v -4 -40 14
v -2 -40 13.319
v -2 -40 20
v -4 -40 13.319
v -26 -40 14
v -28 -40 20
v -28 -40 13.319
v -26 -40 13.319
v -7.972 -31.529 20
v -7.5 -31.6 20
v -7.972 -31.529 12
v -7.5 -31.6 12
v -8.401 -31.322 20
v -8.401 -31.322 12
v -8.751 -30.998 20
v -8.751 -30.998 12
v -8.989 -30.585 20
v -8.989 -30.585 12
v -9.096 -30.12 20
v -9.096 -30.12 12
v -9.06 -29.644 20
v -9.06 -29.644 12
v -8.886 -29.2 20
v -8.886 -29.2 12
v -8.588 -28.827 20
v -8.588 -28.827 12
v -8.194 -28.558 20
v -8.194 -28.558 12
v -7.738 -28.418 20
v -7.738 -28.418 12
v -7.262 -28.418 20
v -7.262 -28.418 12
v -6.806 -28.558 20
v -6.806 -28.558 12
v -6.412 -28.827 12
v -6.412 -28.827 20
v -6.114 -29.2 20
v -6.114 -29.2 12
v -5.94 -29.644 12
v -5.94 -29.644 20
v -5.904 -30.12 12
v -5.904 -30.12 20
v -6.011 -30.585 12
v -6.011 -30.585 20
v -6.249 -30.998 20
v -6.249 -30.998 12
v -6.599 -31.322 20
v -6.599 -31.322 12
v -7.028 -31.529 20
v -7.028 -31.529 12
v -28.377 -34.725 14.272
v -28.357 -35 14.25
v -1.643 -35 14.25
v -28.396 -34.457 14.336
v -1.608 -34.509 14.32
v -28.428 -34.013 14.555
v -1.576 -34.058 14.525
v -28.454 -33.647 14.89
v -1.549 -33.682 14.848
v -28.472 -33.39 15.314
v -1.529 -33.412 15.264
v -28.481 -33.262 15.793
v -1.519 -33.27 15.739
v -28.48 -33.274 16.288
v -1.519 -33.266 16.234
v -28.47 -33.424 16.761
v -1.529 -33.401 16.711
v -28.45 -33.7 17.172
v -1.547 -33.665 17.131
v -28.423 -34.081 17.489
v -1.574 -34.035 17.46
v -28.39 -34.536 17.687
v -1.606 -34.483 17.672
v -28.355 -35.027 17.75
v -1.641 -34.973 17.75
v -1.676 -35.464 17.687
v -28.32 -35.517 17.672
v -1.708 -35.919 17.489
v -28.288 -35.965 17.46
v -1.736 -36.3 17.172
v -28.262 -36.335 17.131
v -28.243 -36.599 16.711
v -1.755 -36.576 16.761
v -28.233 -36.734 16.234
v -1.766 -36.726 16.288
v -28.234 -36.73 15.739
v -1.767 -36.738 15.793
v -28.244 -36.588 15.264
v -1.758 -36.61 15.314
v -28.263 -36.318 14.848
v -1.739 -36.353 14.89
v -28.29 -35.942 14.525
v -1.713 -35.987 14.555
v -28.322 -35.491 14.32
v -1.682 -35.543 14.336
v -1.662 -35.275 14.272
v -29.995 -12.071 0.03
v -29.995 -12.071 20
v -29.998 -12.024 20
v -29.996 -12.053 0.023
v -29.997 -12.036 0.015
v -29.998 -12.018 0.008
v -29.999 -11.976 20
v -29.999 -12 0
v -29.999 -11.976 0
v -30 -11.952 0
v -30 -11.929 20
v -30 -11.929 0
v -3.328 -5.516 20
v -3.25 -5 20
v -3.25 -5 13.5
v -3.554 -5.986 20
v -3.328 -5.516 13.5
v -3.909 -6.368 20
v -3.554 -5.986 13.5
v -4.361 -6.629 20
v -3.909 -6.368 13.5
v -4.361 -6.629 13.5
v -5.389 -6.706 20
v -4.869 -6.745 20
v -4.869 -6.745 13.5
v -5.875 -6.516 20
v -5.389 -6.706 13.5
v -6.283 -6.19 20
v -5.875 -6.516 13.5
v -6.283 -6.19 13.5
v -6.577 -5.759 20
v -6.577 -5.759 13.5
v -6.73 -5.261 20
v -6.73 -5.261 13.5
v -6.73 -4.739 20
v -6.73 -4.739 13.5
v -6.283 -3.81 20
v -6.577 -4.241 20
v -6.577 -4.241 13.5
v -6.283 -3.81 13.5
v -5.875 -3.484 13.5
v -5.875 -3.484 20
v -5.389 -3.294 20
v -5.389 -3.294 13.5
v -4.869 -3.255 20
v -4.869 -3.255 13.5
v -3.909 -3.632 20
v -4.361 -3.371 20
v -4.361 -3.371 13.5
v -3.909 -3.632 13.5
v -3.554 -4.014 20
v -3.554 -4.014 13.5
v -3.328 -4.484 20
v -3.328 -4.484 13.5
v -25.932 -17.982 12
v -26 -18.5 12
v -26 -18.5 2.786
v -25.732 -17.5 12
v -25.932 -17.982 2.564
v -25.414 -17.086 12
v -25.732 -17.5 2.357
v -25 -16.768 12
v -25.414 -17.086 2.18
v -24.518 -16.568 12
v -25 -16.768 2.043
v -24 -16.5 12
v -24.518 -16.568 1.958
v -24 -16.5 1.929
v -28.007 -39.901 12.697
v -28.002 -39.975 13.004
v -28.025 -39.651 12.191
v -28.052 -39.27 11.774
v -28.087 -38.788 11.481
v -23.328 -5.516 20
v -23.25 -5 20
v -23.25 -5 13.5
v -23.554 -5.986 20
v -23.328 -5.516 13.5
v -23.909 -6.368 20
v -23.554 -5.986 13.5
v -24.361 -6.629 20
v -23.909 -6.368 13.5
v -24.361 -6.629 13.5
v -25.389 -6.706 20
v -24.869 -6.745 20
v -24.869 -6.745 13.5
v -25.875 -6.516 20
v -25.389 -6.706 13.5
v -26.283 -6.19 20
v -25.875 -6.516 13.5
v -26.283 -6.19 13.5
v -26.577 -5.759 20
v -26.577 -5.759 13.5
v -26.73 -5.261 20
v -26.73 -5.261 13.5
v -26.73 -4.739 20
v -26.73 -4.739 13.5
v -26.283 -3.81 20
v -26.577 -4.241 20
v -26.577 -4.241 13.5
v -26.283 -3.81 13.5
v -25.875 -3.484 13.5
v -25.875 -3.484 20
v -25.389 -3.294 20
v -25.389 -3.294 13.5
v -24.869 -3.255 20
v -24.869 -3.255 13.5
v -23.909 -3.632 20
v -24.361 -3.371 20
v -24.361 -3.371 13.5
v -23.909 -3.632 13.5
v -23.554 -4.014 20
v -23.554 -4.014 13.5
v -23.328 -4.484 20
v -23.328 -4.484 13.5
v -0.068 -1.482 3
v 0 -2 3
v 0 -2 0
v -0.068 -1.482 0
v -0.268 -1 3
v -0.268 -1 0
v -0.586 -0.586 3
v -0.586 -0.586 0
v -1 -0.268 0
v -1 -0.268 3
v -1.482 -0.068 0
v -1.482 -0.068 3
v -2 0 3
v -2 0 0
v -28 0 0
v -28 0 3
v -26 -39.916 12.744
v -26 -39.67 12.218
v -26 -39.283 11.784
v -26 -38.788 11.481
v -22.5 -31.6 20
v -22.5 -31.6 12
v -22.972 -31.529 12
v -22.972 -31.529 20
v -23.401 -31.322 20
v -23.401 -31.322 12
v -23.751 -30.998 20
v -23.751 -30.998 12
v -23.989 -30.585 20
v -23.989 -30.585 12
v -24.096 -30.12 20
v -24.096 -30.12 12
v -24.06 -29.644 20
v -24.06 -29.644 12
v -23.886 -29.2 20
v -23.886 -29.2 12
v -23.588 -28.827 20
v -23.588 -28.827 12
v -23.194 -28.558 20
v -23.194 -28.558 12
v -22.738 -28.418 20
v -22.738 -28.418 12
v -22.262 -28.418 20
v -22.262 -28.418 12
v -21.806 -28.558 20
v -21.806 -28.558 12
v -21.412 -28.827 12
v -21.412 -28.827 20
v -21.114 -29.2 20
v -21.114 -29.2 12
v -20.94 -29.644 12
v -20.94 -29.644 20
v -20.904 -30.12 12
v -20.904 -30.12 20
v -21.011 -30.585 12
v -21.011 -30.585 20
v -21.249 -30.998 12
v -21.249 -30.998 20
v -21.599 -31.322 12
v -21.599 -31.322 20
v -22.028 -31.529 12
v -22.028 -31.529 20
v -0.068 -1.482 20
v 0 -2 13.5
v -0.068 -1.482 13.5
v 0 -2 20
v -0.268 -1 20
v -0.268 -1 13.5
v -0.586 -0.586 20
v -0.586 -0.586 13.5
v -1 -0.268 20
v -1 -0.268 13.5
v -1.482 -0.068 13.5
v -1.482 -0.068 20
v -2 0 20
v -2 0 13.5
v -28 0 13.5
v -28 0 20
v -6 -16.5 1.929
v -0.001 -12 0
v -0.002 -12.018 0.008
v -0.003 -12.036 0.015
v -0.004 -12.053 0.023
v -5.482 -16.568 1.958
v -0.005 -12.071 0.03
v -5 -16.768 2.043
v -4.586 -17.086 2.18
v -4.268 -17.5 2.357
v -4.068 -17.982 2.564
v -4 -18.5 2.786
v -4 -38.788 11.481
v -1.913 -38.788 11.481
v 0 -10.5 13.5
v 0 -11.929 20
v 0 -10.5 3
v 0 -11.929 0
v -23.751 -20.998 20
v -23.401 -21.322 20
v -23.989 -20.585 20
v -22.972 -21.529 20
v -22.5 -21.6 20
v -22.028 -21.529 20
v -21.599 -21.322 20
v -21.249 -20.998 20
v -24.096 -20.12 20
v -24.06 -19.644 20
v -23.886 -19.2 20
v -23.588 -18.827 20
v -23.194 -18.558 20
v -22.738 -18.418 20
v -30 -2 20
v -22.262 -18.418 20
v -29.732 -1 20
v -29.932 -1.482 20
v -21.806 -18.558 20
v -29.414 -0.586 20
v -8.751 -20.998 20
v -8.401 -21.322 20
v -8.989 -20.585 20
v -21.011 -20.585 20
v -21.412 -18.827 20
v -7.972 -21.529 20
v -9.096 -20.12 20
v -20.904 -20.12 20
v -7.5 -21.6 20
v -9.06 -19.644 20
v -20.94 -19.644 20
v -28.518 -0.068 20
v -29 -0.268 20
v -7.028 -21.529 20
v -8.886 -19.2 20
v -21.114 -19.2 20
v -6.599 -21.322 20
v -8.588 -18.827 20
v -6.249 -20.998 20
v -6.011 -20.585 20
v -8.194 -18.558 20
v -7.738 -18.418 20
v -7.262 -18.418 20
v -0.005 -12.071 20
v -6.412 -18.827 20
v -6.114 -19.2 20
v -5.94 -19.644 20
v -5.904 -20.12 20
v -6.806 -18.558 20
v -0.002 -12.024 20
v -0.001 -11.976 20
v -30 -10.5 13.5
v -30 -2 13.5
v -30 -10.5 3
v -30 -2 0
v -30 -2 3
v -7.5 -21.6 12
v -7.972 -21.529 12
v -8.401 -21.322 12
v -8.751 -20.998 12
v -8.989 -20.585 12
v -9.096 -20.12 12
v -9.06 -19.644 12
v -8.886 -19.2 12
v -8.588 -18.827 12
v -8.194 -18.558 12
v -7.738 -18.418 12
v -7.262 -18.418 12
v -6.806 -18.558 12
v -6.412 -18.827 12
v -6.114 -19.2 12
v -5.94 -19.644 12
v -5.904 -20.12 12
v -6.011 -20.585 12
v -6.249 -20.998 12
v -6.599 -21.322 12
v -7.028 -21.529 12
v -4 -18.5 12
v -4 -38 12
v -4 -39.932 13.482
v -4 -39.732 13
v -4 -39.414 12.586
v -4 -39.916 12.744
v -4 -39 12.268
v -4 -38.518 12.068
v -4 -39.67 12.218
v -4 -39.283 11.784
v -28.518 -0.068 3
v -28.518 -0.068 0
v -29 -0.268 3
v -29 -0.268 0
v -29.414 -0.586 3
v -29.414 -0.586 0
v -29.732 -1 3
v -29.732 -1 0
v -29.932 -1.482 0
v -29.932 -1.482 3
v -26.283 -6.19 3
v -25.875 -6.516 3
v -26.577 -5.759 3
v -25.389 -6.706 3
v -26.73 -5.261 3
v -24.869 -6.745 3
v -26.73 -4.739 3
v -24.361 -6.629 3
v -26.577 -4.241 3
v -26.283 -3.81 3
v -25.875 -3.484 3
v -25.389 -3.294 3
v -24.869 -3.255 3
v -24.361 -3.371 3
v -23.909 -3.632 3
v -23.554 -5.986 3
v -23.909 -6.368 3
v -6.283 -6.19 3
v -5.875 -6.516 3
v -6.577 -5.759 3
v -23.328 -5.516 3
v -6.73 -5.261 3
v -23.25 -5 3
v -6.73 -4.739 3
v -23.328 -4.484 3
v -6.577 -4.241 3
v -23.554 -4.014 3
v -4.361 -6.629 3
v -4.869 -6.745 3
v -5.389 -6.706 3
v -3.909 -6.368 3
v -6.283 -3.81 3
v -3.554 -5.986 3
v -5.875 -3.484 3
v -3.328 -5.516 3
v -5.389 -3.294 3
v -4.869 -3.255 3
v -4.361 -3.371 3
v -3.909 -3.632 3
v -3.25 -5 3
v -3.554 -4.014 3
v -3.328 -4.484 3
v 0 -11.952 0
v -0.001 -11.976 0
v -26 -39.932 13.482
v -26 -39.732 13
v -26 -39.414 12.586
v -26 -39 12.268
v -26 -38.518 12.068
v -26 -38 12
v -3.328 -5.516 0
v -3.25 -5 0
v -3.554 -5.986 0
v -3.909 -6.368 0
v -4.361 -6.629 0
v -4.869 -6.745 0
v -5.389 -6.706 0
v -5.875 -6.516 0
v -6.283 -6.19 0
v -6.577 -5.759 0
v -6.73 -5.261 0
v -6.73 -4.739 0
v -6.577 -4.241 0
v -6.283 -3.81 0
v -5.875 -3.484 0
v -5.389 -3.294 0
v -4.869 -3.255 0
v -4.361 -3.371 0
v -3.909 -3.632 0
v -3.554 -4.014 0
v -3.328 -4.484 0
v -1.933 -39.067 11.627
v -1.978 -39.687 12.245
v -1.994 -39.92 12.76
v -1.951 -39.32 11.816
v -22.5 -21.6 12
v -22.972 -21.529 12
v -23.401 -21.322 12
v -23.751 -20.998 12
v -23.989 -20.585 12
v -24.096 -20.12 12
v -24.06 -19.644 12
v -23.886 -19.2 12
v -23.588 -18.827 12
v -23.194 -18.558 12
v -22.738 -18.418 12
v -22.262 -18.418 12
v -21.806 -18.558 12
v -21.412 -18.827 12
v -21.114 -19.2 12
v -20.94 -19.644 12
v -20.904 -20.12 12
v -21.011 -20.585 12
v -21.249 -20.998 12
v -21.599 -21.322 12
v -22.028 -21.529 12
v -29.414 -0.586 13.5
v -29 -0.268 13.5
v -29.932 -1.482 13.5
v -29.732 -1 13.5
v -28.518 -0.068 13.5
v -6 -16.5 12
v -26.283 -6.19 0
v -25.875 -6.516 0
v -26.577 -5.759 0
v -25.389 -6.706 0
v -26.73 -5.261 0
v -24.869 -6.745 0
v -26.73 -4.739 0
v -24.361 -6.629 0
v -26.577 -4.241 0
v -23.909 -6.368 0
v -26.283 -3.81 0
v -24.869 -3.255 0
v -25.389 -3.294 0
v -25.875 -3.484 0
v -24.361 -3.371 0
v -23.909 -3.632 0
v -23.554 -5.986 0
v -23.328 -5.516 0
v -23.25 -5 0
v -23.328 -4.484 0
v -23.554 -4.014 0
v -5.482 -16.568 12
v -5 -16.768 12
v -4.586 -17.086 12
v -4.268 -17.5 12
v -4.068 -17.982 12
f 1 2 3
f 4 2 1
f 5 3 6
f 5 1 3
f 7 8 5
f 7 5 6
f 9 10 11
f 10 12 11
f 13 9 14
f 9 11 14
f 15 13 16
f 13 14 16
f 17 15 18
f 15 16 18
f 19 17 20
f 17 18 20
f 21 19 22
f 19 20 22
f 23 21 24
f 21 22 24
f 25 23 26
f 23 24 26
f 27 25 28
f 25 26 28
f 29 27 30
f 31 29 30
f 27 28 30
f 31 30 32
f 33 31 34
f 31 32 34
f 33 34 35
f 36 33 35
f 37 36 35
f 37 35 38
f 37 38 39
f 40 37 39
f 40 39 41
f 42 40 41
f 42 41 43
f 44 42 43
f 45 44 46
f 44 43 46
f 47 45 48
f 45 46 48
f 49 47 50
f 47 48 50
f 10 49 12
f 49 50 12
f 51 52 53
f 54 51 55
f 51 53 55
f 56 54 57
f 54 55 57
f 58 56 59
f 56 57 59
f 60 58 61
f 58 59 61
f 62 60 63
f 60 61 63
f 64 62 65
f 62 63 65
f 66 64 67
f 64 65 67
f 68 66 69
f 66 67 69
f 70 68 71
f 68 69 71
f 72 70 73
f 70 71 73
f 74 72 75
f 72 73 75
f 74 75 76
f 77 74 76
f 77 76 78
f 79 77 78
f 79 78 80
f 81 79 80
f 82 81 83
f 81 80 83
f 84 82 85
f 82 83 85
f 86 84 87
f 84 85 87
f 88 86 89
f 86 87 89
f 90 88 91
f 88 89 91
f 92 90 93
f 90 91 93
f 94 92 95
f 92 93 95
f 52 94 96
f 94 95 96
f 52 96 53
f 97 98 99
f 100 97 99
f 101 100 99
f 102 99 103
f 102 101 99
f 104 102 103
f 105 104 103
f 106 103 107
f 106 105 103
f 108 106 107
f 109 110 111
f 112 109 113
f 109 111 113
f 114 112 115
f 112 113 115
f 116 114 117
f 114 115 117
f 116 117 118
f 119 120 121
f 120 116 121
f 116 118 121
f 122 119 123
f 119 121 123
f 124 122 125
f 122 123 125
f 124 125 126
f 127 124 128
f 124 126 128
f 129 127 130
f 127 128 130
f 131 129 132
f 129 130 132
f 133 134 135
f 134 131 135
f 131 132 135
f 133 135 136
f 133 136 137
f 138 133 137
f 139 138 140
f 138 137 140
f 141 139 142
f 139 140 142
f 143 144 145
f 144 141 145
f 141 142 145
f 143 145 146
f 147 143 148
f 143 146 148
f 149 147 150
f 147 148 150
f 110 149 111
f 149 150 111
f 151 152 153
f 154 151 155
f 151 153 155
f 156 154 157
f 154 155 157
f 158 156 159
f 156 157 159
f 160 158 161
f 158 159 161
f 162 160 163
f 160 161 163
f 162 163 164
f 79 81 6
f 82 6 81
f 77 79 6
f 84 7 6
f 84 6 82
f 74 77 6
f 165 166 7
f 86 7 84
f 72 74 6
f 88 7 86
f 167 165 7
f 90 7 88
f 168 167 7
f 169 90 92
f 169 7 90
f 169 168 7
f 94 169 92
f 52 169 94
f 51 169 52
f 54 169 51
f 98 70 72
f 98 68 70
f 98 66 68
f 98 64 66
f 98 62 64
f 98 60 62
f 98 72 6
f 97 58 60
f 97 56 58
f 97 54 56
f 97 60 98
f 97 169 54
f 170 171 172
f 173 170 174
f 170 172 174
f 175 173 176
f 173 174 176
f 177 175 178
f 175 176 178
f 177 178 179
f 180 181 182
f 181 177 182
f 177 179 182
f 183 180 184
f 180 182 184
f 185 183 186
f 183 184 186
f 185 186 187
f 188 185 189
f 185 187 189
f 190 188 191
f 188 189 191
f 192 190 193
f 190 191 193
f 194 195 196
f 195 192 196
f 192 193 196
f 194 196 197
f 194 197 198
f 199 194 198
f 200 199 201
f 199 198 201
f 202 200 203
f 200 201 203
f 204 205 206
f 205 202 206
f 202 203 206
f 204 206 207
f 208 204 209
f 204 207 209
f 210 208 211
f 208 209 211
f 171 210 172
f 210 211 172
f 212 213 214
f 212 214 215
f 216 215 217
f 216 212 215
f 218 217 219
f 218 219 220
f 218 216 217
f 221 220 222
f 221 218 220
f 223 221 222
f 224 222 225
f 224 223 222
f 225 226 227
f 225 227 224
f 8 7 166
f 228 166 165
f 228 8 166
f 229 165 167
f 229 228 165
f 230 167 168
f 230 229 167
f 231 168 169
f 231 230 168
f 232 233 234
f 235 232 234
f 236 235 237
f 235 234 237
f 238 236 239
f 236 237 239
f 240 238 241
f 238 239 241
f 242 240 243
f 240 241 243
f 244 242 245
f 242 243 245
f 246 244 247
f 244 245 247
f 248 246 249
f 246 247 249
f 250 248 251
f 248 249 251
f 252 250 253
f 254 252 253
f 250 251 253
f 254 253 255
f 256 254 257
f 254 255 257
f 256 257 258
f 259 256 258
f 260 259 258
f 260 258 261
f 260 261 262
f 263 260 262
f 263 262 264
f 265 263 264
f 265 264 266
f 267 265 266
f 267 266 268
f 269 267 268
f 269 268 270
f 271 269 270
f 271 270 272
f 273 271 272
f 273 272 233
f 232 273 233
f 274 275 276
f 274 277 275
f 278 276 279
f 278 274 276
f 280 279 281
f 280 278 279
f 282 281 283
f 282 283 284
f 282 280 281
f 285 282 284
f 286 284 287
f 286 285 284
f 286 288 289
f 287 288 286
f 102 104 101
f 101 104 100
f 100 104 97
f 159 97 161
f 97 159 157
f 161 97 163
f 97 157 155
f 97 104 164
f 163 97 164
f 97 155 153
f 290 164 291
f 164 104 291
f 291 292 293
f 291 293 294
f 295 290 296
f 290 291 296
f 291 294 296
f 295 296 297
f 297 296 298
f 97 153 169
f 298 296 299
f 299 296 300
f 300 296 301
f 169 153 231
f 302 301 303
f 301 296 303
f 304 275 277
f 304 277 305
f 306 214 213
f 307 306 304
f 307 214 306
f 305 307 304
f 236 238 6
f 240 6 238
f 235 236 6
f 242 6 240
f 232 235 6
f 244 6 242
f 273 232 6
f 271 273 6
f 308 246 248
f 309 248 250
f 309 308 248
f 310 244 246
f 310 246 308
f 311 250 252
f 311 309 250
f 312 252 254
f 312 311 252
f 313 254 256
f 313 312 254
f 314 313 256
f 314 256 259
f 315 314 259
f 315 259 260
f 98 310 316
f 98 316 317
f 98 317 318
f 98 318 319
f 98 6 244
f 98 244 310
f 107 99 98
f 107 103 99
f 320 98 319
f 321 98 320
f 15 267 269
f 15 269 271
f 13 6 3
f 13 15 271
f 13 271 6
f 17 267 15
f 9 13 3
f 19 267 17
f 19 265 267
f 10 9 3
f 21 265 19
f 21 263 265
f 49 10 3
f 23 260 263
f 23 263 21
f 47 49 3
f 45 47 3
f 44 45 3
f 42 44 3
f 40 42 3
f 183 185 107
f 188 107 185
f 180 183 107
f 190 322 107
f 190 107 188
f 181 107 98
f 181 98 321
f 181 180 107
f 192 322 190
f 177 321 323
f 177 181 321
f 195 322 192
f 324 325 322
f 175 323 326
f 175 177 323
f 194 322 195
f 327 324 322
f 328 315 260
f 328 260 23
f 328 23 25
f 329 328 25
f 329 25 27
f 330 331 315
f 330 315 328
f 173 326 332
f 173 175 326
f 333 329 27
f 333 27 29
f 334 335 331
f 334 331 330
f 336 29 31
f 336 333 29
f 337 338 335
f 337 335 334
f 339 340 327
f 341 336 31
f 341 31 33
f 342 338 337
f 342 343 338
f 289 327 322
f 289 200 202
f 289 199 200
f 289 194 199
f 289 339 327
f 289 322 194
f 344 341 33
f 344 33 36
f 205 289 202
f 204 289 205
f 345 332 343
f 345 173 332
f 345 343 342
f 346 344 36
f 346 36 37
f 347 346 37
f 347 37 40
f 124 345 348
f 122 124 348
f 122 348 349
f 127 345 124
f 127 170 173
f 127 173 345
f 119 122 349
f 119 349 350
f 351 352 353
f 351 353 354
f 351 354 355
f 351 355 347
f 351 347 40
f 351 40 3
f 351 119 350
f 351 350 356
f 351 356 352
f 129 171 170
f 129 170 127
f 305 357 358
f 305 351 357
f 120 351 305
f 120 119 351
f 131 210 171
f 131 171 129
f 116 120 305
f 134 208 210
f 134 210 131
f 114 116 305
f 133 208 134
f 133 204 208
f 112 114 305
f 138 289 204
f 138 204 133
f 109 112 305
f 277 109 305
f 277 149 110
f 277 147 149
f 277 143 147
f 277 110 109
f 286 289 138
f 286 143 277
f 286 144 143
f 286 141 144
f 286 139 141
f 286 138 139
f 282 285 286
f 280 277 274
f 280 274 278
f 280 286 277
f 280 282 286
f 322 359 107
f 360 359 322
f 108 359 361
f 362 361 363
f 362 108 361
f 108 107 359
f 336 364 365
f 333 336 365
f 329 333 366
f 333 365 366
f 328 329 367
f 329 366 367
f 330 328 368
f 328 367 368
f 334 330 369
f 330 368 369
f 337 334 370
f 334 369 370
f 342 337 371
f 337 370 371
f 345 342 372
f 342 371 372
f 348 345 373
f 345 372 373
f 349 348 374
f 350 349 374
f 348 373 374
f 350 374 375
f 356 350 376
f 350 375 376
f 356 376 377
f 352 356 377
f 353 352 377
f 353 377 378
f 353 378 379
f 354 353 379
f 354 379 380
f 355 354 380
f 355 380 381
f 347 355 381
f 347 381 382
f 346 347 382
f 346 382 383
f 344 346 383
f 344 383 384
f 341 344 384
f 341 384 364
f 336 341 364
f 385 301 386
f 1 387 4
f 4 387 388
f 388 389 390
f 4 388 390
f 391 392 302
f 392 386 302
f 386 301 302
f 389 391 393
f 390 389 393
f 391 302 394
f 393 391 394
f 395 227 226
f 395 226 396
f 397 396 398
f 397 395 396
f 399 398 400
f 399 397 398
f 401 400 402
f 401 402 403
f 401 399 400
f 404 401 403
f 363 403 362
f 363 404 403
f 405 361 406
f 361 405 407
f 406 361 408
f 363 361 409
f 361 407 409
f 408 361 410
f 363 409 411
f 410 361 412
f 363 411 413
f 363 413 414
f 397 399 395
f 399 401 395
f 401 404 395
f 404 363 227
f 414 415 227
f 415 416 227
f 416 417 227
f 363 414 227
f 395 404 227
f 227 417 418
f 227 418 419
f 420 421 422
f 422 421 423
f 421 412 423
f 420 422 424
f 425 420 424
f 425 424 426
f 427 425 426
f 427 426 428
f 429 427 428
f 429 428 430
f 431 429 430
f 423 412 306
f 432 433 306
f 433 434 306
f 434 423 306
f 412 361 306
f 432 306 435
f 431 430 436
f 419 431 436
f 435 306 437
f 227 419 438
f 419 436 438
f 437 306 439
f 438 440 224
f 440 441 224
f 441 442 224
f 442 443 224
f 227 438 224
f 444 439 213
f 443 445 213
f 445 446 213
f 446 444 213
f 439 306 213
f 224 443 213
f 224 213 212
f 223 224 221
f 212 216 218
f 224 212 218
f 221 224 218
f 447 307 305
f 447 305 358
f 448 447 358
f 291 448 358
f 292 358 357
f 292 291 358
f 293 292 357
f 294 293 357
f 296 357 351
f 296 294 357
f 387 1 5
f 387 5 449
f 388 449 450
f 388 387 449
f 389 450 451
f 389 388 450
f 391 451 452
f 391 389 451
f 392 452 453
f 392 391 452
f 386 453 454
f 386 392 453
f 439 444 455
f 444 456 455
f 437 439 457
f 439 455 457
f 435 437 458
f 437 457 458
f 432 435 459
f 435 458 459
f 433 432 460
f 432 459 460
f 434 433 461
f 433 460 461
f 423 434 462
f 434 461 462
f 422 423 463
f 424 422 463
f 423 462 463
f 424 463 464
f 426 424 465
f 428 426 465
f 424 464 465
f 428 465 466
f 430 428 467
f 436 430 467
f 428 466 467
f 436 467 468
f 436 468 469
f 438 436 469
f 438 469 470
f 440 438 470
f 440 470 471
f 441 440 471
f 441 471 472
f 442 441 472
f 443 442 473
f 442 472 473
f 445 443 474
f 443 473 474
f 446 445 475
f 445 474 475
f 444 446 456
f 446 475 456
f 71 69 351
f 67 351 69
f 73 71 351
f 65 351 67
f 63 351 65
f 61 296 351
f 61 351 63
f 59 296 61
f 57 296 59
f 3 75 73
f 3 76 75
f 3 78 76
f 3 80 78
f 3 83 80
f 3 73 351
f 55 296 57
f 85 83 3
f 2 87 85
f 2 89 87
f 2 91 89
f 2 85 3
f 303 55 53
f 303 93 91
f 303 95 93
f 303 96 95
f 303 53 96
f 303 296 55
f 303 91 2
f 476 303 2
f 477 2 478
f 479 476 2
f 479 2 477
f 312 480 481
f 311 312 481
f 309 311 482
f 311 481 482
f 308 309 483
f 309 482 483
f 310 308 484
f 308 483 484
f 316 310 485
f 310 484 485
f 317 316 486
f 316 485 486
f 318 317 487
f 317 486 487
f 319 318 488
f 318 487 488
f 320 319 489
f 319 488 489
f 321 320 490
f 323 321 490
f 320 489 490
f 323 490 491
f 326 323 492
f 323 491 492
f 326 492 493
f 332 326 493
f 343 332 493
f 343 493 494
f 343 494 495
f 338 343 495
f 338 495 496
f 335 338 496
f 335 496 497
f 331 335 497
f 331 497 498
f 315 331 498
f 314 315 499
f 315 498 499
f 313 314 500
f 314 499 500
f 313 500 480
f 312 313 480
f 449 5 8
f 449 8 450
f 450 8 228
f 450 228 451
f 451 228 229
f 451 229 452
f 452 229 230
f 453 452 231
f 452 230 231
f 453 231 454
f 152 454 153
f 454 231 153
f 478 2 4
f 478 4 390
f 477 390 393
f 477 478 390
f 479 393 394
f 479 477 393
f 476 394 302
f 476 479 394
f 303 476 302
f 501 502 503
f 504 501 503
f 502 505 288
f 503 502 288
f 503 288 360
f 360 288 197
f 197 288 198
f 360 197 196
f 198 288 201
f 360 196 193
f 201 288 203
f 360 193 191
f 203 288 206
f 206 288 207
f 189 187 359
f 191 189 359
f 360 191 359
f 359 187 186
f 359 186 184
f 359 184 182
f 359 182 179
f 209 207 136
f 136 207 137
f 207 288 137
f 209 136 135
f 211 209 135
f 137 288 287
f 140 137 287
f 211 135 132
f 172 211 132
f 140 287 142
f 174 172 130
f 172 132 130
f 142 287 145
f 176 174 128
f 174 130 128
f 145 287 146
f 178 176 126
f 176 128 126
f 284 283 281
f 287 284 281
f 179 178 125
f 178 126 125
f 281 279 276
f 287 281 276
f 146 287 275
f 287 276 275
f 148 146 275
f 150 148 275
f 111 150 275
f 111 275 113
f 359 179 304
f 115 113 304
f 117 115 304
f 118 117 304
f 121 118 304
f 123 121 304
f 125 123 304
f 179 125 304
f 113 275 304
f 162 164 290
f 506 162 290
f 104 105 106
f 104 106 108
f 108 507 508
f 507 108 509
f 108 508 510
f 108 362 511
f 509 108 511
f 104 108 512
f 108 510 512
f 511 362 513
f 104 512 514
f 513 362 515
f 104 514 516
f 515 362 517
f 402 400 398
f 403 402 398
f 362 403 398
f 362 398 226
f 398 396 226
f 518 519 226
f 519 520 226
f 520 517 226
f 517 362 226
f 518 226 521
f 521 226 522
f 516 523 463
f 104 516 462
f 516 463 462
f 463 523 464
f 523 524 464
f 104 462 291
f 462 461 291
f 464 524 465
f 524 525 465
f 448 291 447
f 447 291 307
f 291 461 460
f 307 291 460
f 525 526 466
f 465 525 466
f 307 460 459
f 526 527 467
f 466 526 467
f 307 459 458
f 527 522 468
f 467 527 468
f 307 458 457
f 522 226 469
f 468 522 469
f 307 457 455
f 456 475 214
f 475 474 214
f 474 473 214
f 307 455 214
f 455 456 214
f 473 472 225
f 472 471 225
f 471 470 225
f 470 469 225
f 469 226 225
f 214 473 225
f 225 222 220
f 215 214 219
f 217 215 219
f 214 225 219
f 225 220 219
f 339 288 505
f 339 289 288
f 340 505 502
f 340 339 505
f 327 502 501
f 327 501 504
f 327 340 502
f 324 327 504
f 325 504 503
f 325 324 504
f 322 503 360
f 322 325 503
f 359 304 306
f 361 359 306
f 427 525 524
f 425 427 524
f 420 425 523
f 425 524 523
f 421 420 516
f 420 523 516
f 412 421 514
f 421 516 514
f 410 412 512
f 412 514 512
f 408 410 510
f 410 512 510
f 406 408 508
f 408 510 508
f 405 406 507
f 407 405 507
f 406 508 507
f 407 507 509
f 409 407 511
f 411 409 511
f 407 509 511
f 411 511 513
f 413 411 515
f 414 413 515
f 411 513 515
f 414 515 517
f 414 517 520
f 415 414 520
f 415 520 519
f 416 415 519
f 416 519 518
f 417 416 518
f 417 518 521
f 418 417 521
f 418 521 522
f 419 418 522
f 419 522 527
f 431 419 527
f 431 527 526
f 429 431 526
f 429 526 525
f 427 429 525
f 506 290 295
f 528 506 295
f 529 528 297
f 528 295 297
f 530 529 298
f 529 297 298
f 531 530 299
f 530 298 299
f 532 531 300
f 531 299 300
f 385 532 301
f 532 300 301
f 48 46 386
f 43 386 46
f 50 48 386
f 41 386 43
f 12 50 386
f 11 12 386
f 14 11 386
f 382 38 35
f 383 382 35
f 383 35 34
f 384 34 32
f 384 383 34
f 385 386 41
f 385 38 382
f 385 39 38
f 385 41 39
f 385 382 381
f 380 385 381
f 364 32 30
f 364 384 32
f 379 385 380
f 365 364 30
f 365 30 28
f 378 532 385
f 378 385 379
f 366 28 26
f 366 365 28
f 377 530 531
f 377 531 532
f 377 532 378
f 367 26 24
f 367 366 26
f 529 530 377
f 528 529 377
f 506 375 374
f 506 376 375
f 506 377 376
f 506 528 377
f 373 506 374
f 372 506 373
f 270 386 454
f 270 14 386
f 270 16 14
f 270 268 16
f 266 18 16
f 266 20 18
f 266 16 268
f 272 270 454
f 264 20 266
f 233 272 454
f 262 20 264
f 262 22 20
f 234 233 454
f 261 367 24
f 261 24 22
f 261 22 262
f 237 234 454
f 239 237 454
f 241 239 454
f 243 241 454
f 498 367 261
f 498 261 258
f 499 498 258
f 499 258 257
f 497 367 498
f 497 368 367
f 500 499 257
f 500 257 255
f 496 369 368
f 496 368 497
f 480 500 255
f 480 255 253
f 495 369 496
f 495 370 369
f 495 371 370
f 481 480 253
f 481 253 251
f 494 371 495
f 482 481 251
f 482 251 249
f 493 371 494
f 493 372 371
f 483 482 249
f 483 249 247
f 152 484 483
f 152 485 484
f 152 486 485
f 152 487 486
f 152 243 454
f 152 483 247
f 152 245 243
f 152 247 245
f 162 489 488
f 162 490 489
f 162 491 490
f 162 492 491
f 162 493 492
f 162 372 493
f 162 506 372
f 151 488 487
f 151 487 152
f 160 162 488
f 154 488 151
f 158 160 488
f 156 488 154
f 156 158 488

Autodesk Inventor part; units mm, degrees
ref_plane "YZ Plane" through (0, 0, 0) normal (1, 0, 0) x (0, 1, 0)
ref_plane "XZ Plane" through (0, 0, 0) normal (0, 1, 0) x (-1, 0, 0)
ref_plane "XY Plane" through (0, 0, 0) normal (0, 0, 1) x (1, 0, 0)
sketch "スケッチ1" plane through (0, 0, 0) normal (0, 0, 1) x (1, 0, 0)
  line L0 (0, 0) -> (0, -12)
  line L1 (0, -12) -> (-2, -40)
  line L2 (-2, -40) -> (-28, -40)
  line L3 (-28, -40) -> (-30, -12)
  line L4 (-30, -12) -> (-30, 0)
  line L5 (-30, 0) -> (0, 0)
  circle A0 centre (-25, -5) radius 1.75
  circle A1 centre (-5, -5) radius 1.75
  dimension "d0" = 12
  dimension "d1" = 30
  dimension "d2" = 40
  dimension "d3" = 2
  dimension "d4" = 26
  dimension "d12" = 3.5
  dimension "d13" = 3.5
  dimension "d14" = 5
  dimension "d15" = 5
  dimension "d16" = 5
extrude "押し出し1" add sketch "スケッチ1" along normal blind 20
sketch "スケッチ2" plane through (0, -12, 0) normal (1, 0, 0) x (0, 0, -1)
  line L0 (0, 12) -> (-20, 12) projected
  line L1 (-3, 12) -> (-13.5, 12)
  line L2 (-13.5, 12) -> (-13.5, 1.5)
  line L3 (-13.5, 1.5) -> (-3, 1.5)
  line L4 (-3, 1.5) -> (-3, 12)
  line L5 (0, 12) -> (0, 0) projected
  line L6 (0, -28) -> (0, 0) projected
  line L7 (0, 0) -> (-12, -28)
  line L8 (0, -28) -> (-20, -28) projected
  circle A0 centre (-16, -23) radius 1.75
  line L9 (-20, -28) -> (-20, 0) projected
  dimension "d7" = 10.5
  dimension "d8" = 10.5
  dimension "d9" = 3
  dimension "d22" = 12
  dimension "d34" = 3.5
  dimension "d35" = 4
  dimension "d36" = 5
extrude "押し出し2" cut sketch "スケッチ2" against normal through all
sketch "スケッチ3" plane through (0, 0, 0) normal (0, 0, -1) x (-1, 0, 0)
  line L0 (4, -40) -> (26, -40)
  line L1 (26, -40) -> (26, -16.5)
  line L2 (26, -16.5) -> (4, -16.5)
  line L3 (4, -16.5) -> (4, -40)
  line L4 (28, -40) -> (2, -40) projected
  point P0 (0, 0)
  dimension "d17" = 23.5
  dimension "d18" = 2
  dimension "d19" = 2
extrude "押し出し3" cut sketch "スケッチ3" against normal blind 12
sketch "スケッチ4" plane through (0, 0, 20) normal (0, 0, 1) x (1, 0, 0)
  line L0 (-22.5, -30) -> (-7.5, -30)
  line L1 (-7.5, -30) -> (-7.5, -20)
  line L2 (-7.5, -20) -> (-22.5, -20)
  line L3 (-22.5, -20) -> (-22.5, -30)
  line L4 (0, 0) -> (-30, 0) projected
  line L5 (0, -12) -> (0, 0) projected
  dimension "d23" = 15
  dimension "d24" = 20
  dimension "d25" = 7.5
  dimension "d26" = 10
hole "穴1" at (-22.5, -20, 20) at (-22.5, -30, 20) at (-7.5, -30, 20) at (-7.5, -20, 20) direction (0, 0, -1) diameter 3.2 end through all
fillet "フィレット1" radius 2 7 edges at (-26, -16.5, 6.9643) (-4, -16.5, 6.9643) (-15, -40, 12) (-3, -40, 12) (-27, -40, 12) (0, -12, 10) (-30, -12, 10)
fillet "フィレット2" radius 2 4 edges at (0, 0, 16.75) (0, 0, 1.5) (-30, 0, 1.5) (-30, 0, 16.75)
properties part number "ma_3d1"
